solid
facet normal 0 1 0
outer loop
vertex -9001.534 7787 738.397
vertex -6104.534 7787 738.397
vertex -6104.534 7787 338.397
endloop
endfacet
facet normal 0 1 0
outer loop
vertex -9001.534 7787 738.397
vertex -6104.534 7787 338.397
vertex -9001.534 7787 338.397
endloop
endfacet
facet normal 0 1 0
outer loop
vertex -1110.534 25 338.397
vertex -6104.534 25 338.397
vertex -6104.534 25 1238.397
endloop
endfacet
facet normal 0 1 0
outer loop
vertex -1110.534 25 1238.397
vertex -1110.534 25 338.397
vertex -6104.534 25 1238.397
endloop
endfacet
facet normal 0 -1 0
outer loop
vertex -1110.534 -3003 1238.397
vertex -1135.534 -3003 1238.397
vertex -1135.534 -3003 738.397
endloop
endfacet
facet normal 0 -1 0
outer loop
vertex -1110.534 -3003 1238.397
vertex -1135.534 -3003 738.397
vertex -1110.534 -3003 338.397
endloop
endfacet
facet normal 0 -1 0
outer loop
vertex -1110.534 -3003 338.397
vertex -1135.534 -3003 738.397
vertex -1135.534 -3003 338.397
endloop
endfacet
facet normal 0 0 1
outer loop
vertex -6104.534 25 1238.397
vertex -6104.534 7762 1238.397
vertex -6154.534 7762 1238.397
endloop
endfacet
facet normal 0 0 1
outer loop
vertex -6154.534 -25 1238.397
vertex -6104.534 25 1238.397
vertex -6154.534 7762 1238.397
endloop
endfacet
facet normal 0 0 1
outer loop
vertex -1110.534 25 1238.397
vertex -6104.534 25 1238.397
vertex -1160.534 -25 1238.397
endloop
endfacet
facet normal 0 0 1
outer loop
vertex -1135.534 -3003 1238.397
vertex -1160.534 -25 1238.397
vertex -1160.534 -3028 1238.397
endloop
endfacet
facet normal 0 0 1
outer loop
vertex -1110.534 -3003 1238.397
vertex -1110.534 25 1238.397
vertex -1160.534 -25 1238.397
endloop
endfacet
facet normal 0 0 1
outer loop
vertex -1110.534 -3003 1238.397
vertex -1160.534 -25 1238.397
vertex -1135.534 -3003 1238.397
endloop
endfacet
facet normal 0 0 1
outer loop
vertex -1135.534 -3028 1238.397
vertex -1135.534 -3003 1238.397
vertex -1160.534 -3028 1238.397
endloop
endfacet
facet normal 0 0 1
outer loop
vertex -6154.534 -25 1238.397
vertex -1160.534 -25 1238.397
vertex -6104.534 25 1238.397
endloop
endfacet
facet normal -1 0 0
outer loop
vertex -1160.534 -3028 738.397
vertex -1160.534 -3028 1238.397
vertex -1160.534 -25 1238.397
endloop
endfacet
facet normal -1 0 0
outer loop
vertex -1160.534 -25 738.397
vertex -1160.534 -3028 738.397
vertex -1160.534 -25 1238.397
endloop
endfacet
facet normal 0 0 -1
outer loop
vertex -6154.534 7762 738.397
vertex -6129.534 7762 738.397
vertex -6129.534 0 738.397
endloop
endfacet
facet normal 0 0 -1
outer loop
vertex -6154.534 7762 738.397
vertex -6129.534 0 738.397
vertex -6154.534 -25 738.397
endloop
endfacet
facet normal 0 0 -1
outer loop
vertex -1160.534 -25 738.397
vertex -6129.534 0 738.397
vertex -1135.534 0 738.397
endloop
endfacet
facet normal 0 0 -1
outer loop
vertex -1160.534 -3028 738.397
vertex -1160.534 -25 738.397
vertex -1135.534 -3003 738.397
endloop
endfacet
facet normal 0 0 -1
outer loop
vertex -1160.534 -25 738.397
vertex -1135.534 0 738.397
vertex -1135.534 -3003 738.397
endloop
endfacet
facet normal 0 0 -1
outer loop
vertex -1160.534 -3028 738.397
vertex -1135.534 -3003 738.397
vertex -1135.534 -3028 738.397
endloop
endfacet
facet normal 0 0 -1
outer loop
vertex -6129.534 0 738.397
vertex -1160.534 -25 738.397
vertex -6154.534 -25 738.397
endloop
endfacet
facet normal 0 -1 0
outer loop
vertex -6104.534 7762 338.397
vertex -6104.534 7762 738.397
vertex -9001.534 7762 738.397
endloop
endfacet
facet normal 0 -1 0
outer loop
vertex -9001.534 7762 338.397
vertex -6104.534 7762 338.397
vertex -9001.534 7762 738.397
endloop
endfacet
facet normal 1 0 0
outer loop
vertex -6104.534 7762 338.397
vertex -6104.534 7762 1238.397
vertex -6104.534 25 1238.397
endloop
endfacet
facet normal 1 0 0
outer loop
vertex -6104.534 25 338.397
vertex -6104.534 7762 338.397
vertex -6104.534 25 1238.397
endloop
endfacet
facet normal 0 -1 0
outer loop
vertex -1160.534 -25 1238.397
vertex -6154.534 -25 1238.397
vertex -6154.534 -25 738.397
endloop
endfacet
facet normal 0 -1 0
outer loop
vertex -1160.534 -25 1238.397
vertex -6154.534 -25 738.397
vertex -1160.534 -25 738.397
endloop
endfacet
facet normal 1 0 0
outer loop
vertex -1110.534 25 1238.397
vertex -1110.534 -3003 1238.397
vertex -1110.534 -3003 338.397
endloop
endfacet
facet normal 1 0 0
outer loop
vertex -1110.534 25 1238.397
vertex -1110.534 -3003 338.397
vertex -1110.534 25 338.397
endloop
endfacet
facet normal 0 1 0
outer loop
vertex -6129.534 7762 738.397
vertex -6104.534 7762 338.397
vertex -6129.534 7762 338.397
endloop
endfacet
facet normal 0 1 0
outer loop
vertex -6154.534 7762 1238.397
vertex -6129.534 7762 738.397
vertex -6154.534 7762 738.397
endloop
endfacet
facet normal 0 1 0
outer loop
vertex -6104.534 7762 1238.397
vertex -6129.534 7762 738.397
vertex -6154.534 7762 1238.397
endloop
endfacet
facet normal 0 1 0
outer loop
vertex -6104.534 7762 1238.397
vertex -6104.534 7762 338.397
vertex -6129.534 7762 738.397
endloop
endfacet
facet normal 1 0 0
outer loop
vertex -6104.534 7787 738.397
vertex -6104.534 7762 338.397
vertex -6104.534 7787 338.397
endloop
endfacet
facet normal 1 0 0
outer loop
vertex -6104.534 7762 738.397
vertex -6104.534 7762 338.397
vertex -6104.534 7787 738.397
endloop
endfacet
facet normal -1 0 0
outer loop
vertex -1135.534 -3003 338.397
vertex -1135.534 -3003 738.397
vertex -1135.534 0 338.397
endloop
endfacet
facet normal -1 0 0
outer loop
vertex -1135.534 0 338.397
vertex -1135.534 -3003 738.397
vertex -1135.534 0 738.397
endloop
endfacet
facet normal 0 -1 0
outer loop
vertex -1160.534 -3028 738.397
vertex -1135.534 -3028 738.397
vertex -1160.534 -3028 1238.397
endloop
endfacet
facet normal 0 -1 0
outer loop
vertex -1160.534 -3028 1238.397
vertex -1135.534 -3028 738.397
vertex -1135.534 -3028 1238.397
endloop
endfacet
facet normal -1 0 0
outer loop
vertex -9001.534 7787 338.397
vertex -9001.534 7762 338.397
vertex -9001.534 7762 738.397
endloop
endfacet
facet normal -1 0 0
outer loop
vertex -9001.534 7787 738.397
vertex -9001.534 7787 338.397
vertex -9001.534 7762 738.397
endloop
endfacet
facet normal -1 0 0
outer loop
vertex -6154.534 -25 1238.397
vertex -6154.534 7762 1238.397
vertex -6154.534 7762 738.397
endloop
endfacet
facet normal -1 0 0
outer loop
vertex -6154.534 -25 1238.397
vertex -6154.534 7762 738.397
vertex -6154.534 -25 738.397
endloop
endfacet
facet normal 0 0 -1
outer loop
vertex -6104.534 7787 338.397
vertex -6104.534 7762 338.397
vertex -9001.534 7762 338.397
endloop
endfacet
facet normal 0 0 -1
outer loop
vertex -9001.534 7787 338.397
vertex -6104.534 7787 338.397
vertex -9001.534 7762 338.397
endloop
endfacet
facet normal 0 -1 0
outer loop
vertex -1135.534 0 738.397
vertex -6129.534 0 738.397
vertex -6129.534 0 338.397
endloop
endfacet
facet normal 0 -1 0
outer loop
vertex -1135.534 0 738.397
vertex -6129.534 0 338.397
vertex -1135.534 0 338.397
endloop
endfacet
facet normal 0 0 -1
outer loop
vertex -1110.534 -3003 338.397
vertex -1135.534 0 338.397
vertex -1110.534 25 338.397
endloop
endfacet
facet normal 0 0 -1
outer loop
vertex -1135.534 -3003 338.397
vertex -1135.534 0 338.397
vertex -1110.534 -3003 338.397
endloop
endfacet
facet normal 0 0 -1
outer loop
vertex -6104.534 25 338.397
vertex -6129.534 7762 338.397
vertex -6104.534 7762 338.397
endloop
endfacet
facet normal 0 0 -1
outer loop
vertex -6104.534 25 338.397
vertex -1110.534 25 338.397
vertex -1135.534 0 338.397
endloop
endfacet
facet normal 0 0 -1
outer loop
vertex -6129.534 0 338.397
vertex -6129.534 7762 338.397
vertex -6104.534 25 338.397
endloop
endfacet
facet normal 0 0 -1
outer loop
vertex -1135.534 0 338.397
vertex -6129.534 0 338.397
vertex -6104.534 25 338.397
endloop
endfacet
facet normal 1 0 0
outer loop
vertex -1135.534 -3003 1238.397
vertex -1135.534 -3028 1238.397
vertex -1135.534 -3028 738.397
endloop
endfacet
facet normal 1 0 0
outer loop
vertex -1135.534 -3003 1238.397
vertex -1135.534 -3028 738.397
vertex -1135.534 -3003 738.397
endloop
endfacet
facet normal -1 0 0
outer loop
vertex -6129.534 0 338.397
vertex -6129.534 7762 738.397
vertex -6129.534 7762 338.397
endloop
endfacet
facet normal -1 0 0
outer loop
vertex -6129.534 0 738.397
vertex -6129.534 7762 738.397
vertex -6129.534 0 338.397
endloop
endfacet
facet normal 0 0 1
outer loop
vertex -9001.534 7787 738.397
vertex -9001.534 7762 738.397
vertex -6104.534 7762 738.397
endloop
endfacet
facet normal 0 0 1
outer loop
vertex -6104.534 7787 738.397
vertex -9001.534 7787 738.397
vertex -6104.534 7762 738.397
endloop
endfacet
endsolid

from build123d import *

# Parameters (mm, degrees)
F1_DEPTH  = 25
F0_W      = 4994
F0_H      = 400
F2_DEPTH  = 25
F3_W      = 2978
F3_H      = 500
F3_W_2    = 25
F4_DEPTH  = 25
F5_DEPTH  = 25
F6_W      = 7737
F6_H      = 500
F6_H_2    = 400
F7_DEPTH  = 25
F8_DEPTH  = 25
F9_W      = 25
F9_H      = 400
F10_DEPTH = 25


with BuildPart() as f1:
    # F0 (on Front) → F1 (new body)
    with BuildSketch(Plane.XZ):
        Polygon((-6154.5335620582, 738.3967787384), (-6129.5335620582, 738.3967787384), (-1135.5335620582, 738.3967787384), (-1135.5335620582, 1238.3967787384), (-6154.5335620582, 1238.3967787384), align=None)
    extrude(amount=F1_DEPTH)

    # F0 (on Front) → F2 (join)
    with BuildSketch(Plane.XZ):
        with Locations((-3632.5335620582, 538.3967787384)):
            Rectangle(F0_W, F0_H)
        Polygon((-6154.5335620582, 738.3967787384), (-6129.5335620582, 738.3967787384), (-1135.5335620582, 738.3967787384), (-1135.5335620582, 1238.3967787384), (-6154.5335620582, 1238.3967787384), align=None)
    extrude(amount=-F2_DEPTH)

    # F3 (on face) → F4 (join)
    with BuildSketch(Plane.YZ.offset(-1135.5335620582)):
        with Locations((-1514, 988.3967787384)):
            Rectangle(F3_W, F3_H)
        with Locations((-3015.5, 988.3967787384)):
            Rectangle(F3_W_2, F3_H)
    extrude(amount=-F4_DEPTH)

    # F3 (on face) → F5 (join)
    with BuildSketch(Plane.YZ.offset(-1135.5335620582)):
        with Locations((-1514, 988.3967787384)):
            Rectangle(F3_W, F3_H)
        Polygon((-3003, 338.3967787384), (0, 338.3967787384), (0, 738.3967787384), (-25, 738.3967787384), (-3003, 738.3967787384), align=None)
        Polygon((0, 338.3967787384), (25, 338.3967787384), (25, 1238.3967787384), (-25, 1238.3967787384), (-25, 738.3967787384), (0, 738.3967787384), align=None)
    extrude(amount=F5_DEPTH)

    # F6 (on face) → F7 (join)
    with BuildSketch(Plane(origin=(-6129.5335620582, 0, 0), x_dir=(0, -1, 0), z_dir=(-1, 0, 0))):
        with Locations((-3893.5, 988.3967787384)):
            Rectangle(F6_W, F6_H)
        with Locations((-3893.5, 538.3967787384)):
            Rectangle(F6_W, F6_H_2)
    extrude(amount=-F7_DEPTH)

    # F6 (on face) → F8 (join)
    with BuildSketch(Plane(origin=(-6129.5335620582, 0, 0), x_dir=(0, -1, 0), z_dir=(-1, 0, 0))):
        with Locations((-3893.5, 988.3967787384)):
            Rectangle(F6_W, F6_H)
    extrude(amount=F8_DEPTH)


with BuildPart() as f10:
    # F9 (on face) → F10 (new body)
    with BuildSketch(Plane(origin=(0, 7762, 0), x_dir=(-1, 0, 0), z_dir=(0, 1, 0))):
        Polygon((6129.5335620582, 738.3967787384), (6129.5335620582, 338.3967787384), (9001.5335620582, 338.3967787384), (9001.5335620582, 738.3967787384), (6154.5335620582, 738.3967787384), align=None)
        with Locations((6117.0335620582, 538.3967787384)):
            Rectangle(F9_W, F9_H)
    extrude(amount=F10_DEPTH)


solid = Compound([f1.part, f10.part])
